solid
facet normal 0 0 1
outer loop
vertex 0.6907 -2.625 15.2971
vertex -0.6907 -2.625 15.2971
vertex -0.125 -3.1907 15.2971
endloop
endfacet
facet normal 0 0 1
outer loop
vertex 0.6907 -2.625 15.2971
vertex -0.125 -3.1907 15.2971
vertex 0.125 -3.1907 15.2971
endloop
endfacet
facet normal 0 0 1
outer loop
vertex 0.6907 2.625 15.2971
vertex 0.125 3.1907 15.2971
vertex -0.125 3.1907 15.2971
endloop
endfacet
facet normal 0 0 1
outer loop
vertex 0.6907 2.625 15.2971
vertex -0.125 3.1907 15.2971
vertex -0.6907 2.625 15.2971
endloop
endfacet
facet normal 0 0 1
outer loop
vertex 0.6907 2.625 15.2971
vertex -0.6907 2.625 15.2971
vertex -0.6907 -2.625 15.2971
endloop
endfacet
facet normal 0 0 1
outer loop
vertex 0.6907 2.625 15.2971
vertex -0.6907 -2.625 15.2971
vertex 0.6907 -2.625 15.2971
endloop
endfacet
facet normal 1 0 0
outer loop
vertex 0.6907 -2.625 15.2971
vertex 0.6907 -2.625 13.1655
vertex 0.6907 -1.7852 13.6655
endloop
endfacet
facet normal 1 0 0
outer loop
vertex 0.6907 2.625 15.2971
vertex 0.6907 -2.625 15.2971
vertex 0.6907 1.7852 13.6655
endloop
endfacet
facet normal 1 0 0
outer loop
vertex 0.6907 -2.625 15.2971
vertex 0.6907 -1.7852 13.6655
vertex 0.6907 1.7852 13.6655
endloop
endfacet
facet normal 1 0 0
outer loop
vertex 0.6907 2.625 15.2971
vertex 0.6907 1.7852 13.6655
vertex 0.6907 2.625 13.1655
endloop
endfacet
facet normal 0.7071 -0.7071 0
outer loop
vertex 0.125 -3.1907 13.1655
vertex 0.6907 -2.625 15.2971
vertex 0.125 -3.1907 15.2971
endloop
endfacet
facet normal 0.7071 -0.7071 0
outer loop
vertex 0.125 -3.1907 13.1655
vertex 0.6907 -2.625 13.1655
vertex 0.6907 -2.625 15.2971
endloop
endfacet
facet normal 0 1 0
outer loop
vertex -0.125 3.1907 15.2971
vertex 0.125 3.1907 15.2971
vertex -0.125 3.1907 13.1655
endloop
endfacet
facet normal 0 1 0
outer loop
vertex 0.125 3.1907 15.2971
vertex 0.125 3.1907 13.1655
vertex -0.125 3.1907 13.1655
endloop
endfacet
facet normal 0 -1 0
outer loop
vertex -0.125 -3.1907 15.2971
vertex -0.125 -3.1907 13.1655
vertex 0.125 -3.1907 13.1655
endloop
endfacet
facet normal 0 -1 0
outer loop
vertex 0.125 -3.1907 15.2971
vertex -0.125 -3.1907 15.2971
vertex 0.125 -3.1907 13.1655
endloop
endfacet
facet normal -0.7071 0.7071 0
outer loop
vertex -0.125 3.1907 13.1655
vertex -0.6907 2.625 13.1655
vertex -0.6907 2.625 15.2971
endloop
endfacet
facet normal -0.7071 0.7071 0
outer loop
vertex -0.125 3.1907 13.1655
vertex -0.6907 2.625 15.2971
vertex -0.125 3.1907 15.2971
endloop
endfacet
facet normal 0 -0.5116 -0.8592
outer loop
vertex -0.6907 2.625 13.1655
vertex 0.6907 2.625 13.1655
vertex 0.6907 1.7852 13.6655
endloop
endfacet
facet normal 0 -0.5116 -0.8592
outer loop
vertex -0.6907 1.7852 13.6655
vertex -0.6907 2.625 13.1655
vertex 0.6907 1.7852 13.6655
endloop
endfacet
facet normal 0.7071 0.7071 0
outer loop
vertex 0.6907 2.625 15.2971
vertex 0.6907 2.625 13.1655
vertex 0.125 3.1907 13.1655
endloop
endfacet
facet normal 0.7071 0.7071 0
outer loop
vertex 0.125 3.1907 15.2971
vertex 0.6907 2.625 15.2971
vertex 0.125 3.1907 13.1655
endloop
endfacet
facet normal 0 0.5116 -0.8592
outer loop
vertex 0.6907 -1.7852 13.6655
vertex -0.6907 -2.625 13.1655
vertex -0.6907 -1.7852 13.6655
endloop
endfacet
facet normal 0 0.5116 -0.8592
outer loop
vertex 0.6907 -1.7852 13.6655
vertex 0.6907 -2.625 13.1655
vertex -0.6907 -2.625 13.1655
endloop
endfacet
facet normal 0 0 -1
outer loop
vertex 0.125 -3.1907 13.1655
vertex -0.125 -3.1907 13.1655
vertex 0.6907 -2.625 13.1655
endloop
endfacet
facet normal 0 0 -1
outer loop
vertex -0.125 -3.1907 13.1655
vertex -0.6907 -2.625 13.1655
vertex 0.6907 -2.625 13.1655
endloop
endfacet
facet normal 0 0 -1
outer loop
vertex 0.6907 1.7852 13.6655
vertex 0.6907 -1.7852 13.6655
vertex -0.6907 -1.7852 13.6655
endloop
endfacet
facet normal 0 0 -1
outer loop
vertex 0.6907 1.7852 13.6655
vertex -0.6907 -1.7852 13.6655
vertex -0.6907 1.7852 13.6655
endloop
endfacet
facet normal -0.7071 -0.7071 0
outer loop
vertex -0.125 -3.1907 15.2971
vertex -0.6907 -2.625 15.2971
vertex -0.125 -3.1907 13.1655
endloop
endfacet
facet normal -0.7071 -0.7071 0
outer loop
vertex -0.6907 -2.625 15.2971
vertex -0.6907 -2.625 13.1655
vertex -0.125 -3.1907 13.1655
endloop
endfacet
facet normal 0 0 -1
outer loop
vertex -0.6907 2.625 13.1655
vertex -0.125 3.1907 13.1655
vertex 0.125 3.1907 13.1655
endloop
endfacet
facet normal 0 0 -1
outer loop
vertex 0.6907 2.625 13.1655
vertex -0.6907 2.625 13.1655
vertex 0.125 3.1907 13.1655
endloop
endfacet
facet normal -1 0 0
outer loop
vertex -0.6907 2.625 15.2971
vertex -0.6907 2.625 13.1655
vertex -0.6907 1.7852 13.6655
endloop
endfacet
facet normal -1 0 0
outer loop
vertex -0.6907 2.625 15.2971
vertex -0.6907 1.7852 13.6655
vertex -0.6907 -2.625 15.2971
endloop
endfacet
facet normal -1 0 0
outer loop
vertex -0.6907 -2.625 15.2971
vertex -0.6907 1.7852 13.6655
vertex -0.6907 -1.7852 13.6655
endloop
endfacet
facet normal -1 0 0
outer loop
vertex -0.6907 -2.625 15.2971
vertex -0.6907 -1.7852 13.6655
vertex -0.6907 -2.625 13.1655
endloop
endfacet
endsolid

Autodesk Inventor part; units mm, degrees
ref_plane "YZ Plane" through (0, 0, 0) normal (1, 0, 0) x (0, 1, 0)
ref_plane "XZ Plane" through (0, 0, 0) normal (0, 1, 0) x (-1, 0, 0)
sketch "Sketch1" plane through (0, 0, 0) normal (1, 0, 0) x (0, 1, 0)
  line L0 (2.625, 15.2971) -> (2.625, 13.1655) projected
  line L1 (2.625, 13.1655) -> (3.1907, 13.1655) projected
  line L2 (3.1907, 13.1655) -> (3.1907, 15.2971) projected
  line L3 (3.1907, 15.2971) -> (2.625, 15.2971) projected
  point P0 (0, 0)
ref_plane "Work Plane2" through (0, 2.625, 13.1655) normal (0, 0, 1) x (1, 0, 0)
ref_plane "Work Plane1" through (0, 0, 0) normal (0, 0, 1) x (1, 0, 0)
sketch "Sketch2" plane through (0, 2.625, 13.1655) normal (0, 0, 1) x (1, 0, 0)
  line L0 (-0.6907, 0) -> (-0.125, 0.5657) projected
  line L1 (0.6907, 0) -> (0.125, 0.5657) projected
  line L2 (-0.6907, -5.25) -> (-0.125, -5.8157) projected
  line L3 (0.6907, -5.25) -> (0.125, -5.8157) projected
  line L4 (-0.6907, 0) -> (-0.6907, -5.25)
  line L5 (-0.125, -5.8157) -> (0.125, -5.8157)
  line L6 (0.6907, -5.25) -> (0.6907, 0)
  line L7 (0.125, 0.5657) -> (-0.125, 0.5657)
  point P0 (0, -2.625)
extrude "Extrusion1" add sketch "Sketch2" along normal up to surface (2.1316 mm away)
sketch "Sketch3" plane through (0.6907, -2.625, 13.1655) normal (1, 0, 0) x (0, 0, -1)
  line L0 (0, 5.25) -> (-2.3345, 8.1092) projected
  line L1 (0, 5.25) -> (0, 5.8157) projected
  line L2 (0, 5.25) -> (-0.5, 4.4102)
  line L3 (0, 5.25) -> (0, 0) projected
  line L4 (0, 2.625) -> (-0.5, 2.625)
  line L5 (0, 0) -> (-0.5, 0.8398)
  line L6 (0, 5.25) -> (-2.1316, 5.25) projected
  line L7 (0, 5.25) -> (0, 0)
  line L8 (-0.5, 0.8398) -> (-0.5, 4.4102)
  point P0 (13.1655, 2.625)
  dimension "d2" = 110
  dimension "d3" = 0.5
extrude "Extrusion2" cut sketch "Sketch3" against normal blind 10
properties part number "LegConnectorBase"
